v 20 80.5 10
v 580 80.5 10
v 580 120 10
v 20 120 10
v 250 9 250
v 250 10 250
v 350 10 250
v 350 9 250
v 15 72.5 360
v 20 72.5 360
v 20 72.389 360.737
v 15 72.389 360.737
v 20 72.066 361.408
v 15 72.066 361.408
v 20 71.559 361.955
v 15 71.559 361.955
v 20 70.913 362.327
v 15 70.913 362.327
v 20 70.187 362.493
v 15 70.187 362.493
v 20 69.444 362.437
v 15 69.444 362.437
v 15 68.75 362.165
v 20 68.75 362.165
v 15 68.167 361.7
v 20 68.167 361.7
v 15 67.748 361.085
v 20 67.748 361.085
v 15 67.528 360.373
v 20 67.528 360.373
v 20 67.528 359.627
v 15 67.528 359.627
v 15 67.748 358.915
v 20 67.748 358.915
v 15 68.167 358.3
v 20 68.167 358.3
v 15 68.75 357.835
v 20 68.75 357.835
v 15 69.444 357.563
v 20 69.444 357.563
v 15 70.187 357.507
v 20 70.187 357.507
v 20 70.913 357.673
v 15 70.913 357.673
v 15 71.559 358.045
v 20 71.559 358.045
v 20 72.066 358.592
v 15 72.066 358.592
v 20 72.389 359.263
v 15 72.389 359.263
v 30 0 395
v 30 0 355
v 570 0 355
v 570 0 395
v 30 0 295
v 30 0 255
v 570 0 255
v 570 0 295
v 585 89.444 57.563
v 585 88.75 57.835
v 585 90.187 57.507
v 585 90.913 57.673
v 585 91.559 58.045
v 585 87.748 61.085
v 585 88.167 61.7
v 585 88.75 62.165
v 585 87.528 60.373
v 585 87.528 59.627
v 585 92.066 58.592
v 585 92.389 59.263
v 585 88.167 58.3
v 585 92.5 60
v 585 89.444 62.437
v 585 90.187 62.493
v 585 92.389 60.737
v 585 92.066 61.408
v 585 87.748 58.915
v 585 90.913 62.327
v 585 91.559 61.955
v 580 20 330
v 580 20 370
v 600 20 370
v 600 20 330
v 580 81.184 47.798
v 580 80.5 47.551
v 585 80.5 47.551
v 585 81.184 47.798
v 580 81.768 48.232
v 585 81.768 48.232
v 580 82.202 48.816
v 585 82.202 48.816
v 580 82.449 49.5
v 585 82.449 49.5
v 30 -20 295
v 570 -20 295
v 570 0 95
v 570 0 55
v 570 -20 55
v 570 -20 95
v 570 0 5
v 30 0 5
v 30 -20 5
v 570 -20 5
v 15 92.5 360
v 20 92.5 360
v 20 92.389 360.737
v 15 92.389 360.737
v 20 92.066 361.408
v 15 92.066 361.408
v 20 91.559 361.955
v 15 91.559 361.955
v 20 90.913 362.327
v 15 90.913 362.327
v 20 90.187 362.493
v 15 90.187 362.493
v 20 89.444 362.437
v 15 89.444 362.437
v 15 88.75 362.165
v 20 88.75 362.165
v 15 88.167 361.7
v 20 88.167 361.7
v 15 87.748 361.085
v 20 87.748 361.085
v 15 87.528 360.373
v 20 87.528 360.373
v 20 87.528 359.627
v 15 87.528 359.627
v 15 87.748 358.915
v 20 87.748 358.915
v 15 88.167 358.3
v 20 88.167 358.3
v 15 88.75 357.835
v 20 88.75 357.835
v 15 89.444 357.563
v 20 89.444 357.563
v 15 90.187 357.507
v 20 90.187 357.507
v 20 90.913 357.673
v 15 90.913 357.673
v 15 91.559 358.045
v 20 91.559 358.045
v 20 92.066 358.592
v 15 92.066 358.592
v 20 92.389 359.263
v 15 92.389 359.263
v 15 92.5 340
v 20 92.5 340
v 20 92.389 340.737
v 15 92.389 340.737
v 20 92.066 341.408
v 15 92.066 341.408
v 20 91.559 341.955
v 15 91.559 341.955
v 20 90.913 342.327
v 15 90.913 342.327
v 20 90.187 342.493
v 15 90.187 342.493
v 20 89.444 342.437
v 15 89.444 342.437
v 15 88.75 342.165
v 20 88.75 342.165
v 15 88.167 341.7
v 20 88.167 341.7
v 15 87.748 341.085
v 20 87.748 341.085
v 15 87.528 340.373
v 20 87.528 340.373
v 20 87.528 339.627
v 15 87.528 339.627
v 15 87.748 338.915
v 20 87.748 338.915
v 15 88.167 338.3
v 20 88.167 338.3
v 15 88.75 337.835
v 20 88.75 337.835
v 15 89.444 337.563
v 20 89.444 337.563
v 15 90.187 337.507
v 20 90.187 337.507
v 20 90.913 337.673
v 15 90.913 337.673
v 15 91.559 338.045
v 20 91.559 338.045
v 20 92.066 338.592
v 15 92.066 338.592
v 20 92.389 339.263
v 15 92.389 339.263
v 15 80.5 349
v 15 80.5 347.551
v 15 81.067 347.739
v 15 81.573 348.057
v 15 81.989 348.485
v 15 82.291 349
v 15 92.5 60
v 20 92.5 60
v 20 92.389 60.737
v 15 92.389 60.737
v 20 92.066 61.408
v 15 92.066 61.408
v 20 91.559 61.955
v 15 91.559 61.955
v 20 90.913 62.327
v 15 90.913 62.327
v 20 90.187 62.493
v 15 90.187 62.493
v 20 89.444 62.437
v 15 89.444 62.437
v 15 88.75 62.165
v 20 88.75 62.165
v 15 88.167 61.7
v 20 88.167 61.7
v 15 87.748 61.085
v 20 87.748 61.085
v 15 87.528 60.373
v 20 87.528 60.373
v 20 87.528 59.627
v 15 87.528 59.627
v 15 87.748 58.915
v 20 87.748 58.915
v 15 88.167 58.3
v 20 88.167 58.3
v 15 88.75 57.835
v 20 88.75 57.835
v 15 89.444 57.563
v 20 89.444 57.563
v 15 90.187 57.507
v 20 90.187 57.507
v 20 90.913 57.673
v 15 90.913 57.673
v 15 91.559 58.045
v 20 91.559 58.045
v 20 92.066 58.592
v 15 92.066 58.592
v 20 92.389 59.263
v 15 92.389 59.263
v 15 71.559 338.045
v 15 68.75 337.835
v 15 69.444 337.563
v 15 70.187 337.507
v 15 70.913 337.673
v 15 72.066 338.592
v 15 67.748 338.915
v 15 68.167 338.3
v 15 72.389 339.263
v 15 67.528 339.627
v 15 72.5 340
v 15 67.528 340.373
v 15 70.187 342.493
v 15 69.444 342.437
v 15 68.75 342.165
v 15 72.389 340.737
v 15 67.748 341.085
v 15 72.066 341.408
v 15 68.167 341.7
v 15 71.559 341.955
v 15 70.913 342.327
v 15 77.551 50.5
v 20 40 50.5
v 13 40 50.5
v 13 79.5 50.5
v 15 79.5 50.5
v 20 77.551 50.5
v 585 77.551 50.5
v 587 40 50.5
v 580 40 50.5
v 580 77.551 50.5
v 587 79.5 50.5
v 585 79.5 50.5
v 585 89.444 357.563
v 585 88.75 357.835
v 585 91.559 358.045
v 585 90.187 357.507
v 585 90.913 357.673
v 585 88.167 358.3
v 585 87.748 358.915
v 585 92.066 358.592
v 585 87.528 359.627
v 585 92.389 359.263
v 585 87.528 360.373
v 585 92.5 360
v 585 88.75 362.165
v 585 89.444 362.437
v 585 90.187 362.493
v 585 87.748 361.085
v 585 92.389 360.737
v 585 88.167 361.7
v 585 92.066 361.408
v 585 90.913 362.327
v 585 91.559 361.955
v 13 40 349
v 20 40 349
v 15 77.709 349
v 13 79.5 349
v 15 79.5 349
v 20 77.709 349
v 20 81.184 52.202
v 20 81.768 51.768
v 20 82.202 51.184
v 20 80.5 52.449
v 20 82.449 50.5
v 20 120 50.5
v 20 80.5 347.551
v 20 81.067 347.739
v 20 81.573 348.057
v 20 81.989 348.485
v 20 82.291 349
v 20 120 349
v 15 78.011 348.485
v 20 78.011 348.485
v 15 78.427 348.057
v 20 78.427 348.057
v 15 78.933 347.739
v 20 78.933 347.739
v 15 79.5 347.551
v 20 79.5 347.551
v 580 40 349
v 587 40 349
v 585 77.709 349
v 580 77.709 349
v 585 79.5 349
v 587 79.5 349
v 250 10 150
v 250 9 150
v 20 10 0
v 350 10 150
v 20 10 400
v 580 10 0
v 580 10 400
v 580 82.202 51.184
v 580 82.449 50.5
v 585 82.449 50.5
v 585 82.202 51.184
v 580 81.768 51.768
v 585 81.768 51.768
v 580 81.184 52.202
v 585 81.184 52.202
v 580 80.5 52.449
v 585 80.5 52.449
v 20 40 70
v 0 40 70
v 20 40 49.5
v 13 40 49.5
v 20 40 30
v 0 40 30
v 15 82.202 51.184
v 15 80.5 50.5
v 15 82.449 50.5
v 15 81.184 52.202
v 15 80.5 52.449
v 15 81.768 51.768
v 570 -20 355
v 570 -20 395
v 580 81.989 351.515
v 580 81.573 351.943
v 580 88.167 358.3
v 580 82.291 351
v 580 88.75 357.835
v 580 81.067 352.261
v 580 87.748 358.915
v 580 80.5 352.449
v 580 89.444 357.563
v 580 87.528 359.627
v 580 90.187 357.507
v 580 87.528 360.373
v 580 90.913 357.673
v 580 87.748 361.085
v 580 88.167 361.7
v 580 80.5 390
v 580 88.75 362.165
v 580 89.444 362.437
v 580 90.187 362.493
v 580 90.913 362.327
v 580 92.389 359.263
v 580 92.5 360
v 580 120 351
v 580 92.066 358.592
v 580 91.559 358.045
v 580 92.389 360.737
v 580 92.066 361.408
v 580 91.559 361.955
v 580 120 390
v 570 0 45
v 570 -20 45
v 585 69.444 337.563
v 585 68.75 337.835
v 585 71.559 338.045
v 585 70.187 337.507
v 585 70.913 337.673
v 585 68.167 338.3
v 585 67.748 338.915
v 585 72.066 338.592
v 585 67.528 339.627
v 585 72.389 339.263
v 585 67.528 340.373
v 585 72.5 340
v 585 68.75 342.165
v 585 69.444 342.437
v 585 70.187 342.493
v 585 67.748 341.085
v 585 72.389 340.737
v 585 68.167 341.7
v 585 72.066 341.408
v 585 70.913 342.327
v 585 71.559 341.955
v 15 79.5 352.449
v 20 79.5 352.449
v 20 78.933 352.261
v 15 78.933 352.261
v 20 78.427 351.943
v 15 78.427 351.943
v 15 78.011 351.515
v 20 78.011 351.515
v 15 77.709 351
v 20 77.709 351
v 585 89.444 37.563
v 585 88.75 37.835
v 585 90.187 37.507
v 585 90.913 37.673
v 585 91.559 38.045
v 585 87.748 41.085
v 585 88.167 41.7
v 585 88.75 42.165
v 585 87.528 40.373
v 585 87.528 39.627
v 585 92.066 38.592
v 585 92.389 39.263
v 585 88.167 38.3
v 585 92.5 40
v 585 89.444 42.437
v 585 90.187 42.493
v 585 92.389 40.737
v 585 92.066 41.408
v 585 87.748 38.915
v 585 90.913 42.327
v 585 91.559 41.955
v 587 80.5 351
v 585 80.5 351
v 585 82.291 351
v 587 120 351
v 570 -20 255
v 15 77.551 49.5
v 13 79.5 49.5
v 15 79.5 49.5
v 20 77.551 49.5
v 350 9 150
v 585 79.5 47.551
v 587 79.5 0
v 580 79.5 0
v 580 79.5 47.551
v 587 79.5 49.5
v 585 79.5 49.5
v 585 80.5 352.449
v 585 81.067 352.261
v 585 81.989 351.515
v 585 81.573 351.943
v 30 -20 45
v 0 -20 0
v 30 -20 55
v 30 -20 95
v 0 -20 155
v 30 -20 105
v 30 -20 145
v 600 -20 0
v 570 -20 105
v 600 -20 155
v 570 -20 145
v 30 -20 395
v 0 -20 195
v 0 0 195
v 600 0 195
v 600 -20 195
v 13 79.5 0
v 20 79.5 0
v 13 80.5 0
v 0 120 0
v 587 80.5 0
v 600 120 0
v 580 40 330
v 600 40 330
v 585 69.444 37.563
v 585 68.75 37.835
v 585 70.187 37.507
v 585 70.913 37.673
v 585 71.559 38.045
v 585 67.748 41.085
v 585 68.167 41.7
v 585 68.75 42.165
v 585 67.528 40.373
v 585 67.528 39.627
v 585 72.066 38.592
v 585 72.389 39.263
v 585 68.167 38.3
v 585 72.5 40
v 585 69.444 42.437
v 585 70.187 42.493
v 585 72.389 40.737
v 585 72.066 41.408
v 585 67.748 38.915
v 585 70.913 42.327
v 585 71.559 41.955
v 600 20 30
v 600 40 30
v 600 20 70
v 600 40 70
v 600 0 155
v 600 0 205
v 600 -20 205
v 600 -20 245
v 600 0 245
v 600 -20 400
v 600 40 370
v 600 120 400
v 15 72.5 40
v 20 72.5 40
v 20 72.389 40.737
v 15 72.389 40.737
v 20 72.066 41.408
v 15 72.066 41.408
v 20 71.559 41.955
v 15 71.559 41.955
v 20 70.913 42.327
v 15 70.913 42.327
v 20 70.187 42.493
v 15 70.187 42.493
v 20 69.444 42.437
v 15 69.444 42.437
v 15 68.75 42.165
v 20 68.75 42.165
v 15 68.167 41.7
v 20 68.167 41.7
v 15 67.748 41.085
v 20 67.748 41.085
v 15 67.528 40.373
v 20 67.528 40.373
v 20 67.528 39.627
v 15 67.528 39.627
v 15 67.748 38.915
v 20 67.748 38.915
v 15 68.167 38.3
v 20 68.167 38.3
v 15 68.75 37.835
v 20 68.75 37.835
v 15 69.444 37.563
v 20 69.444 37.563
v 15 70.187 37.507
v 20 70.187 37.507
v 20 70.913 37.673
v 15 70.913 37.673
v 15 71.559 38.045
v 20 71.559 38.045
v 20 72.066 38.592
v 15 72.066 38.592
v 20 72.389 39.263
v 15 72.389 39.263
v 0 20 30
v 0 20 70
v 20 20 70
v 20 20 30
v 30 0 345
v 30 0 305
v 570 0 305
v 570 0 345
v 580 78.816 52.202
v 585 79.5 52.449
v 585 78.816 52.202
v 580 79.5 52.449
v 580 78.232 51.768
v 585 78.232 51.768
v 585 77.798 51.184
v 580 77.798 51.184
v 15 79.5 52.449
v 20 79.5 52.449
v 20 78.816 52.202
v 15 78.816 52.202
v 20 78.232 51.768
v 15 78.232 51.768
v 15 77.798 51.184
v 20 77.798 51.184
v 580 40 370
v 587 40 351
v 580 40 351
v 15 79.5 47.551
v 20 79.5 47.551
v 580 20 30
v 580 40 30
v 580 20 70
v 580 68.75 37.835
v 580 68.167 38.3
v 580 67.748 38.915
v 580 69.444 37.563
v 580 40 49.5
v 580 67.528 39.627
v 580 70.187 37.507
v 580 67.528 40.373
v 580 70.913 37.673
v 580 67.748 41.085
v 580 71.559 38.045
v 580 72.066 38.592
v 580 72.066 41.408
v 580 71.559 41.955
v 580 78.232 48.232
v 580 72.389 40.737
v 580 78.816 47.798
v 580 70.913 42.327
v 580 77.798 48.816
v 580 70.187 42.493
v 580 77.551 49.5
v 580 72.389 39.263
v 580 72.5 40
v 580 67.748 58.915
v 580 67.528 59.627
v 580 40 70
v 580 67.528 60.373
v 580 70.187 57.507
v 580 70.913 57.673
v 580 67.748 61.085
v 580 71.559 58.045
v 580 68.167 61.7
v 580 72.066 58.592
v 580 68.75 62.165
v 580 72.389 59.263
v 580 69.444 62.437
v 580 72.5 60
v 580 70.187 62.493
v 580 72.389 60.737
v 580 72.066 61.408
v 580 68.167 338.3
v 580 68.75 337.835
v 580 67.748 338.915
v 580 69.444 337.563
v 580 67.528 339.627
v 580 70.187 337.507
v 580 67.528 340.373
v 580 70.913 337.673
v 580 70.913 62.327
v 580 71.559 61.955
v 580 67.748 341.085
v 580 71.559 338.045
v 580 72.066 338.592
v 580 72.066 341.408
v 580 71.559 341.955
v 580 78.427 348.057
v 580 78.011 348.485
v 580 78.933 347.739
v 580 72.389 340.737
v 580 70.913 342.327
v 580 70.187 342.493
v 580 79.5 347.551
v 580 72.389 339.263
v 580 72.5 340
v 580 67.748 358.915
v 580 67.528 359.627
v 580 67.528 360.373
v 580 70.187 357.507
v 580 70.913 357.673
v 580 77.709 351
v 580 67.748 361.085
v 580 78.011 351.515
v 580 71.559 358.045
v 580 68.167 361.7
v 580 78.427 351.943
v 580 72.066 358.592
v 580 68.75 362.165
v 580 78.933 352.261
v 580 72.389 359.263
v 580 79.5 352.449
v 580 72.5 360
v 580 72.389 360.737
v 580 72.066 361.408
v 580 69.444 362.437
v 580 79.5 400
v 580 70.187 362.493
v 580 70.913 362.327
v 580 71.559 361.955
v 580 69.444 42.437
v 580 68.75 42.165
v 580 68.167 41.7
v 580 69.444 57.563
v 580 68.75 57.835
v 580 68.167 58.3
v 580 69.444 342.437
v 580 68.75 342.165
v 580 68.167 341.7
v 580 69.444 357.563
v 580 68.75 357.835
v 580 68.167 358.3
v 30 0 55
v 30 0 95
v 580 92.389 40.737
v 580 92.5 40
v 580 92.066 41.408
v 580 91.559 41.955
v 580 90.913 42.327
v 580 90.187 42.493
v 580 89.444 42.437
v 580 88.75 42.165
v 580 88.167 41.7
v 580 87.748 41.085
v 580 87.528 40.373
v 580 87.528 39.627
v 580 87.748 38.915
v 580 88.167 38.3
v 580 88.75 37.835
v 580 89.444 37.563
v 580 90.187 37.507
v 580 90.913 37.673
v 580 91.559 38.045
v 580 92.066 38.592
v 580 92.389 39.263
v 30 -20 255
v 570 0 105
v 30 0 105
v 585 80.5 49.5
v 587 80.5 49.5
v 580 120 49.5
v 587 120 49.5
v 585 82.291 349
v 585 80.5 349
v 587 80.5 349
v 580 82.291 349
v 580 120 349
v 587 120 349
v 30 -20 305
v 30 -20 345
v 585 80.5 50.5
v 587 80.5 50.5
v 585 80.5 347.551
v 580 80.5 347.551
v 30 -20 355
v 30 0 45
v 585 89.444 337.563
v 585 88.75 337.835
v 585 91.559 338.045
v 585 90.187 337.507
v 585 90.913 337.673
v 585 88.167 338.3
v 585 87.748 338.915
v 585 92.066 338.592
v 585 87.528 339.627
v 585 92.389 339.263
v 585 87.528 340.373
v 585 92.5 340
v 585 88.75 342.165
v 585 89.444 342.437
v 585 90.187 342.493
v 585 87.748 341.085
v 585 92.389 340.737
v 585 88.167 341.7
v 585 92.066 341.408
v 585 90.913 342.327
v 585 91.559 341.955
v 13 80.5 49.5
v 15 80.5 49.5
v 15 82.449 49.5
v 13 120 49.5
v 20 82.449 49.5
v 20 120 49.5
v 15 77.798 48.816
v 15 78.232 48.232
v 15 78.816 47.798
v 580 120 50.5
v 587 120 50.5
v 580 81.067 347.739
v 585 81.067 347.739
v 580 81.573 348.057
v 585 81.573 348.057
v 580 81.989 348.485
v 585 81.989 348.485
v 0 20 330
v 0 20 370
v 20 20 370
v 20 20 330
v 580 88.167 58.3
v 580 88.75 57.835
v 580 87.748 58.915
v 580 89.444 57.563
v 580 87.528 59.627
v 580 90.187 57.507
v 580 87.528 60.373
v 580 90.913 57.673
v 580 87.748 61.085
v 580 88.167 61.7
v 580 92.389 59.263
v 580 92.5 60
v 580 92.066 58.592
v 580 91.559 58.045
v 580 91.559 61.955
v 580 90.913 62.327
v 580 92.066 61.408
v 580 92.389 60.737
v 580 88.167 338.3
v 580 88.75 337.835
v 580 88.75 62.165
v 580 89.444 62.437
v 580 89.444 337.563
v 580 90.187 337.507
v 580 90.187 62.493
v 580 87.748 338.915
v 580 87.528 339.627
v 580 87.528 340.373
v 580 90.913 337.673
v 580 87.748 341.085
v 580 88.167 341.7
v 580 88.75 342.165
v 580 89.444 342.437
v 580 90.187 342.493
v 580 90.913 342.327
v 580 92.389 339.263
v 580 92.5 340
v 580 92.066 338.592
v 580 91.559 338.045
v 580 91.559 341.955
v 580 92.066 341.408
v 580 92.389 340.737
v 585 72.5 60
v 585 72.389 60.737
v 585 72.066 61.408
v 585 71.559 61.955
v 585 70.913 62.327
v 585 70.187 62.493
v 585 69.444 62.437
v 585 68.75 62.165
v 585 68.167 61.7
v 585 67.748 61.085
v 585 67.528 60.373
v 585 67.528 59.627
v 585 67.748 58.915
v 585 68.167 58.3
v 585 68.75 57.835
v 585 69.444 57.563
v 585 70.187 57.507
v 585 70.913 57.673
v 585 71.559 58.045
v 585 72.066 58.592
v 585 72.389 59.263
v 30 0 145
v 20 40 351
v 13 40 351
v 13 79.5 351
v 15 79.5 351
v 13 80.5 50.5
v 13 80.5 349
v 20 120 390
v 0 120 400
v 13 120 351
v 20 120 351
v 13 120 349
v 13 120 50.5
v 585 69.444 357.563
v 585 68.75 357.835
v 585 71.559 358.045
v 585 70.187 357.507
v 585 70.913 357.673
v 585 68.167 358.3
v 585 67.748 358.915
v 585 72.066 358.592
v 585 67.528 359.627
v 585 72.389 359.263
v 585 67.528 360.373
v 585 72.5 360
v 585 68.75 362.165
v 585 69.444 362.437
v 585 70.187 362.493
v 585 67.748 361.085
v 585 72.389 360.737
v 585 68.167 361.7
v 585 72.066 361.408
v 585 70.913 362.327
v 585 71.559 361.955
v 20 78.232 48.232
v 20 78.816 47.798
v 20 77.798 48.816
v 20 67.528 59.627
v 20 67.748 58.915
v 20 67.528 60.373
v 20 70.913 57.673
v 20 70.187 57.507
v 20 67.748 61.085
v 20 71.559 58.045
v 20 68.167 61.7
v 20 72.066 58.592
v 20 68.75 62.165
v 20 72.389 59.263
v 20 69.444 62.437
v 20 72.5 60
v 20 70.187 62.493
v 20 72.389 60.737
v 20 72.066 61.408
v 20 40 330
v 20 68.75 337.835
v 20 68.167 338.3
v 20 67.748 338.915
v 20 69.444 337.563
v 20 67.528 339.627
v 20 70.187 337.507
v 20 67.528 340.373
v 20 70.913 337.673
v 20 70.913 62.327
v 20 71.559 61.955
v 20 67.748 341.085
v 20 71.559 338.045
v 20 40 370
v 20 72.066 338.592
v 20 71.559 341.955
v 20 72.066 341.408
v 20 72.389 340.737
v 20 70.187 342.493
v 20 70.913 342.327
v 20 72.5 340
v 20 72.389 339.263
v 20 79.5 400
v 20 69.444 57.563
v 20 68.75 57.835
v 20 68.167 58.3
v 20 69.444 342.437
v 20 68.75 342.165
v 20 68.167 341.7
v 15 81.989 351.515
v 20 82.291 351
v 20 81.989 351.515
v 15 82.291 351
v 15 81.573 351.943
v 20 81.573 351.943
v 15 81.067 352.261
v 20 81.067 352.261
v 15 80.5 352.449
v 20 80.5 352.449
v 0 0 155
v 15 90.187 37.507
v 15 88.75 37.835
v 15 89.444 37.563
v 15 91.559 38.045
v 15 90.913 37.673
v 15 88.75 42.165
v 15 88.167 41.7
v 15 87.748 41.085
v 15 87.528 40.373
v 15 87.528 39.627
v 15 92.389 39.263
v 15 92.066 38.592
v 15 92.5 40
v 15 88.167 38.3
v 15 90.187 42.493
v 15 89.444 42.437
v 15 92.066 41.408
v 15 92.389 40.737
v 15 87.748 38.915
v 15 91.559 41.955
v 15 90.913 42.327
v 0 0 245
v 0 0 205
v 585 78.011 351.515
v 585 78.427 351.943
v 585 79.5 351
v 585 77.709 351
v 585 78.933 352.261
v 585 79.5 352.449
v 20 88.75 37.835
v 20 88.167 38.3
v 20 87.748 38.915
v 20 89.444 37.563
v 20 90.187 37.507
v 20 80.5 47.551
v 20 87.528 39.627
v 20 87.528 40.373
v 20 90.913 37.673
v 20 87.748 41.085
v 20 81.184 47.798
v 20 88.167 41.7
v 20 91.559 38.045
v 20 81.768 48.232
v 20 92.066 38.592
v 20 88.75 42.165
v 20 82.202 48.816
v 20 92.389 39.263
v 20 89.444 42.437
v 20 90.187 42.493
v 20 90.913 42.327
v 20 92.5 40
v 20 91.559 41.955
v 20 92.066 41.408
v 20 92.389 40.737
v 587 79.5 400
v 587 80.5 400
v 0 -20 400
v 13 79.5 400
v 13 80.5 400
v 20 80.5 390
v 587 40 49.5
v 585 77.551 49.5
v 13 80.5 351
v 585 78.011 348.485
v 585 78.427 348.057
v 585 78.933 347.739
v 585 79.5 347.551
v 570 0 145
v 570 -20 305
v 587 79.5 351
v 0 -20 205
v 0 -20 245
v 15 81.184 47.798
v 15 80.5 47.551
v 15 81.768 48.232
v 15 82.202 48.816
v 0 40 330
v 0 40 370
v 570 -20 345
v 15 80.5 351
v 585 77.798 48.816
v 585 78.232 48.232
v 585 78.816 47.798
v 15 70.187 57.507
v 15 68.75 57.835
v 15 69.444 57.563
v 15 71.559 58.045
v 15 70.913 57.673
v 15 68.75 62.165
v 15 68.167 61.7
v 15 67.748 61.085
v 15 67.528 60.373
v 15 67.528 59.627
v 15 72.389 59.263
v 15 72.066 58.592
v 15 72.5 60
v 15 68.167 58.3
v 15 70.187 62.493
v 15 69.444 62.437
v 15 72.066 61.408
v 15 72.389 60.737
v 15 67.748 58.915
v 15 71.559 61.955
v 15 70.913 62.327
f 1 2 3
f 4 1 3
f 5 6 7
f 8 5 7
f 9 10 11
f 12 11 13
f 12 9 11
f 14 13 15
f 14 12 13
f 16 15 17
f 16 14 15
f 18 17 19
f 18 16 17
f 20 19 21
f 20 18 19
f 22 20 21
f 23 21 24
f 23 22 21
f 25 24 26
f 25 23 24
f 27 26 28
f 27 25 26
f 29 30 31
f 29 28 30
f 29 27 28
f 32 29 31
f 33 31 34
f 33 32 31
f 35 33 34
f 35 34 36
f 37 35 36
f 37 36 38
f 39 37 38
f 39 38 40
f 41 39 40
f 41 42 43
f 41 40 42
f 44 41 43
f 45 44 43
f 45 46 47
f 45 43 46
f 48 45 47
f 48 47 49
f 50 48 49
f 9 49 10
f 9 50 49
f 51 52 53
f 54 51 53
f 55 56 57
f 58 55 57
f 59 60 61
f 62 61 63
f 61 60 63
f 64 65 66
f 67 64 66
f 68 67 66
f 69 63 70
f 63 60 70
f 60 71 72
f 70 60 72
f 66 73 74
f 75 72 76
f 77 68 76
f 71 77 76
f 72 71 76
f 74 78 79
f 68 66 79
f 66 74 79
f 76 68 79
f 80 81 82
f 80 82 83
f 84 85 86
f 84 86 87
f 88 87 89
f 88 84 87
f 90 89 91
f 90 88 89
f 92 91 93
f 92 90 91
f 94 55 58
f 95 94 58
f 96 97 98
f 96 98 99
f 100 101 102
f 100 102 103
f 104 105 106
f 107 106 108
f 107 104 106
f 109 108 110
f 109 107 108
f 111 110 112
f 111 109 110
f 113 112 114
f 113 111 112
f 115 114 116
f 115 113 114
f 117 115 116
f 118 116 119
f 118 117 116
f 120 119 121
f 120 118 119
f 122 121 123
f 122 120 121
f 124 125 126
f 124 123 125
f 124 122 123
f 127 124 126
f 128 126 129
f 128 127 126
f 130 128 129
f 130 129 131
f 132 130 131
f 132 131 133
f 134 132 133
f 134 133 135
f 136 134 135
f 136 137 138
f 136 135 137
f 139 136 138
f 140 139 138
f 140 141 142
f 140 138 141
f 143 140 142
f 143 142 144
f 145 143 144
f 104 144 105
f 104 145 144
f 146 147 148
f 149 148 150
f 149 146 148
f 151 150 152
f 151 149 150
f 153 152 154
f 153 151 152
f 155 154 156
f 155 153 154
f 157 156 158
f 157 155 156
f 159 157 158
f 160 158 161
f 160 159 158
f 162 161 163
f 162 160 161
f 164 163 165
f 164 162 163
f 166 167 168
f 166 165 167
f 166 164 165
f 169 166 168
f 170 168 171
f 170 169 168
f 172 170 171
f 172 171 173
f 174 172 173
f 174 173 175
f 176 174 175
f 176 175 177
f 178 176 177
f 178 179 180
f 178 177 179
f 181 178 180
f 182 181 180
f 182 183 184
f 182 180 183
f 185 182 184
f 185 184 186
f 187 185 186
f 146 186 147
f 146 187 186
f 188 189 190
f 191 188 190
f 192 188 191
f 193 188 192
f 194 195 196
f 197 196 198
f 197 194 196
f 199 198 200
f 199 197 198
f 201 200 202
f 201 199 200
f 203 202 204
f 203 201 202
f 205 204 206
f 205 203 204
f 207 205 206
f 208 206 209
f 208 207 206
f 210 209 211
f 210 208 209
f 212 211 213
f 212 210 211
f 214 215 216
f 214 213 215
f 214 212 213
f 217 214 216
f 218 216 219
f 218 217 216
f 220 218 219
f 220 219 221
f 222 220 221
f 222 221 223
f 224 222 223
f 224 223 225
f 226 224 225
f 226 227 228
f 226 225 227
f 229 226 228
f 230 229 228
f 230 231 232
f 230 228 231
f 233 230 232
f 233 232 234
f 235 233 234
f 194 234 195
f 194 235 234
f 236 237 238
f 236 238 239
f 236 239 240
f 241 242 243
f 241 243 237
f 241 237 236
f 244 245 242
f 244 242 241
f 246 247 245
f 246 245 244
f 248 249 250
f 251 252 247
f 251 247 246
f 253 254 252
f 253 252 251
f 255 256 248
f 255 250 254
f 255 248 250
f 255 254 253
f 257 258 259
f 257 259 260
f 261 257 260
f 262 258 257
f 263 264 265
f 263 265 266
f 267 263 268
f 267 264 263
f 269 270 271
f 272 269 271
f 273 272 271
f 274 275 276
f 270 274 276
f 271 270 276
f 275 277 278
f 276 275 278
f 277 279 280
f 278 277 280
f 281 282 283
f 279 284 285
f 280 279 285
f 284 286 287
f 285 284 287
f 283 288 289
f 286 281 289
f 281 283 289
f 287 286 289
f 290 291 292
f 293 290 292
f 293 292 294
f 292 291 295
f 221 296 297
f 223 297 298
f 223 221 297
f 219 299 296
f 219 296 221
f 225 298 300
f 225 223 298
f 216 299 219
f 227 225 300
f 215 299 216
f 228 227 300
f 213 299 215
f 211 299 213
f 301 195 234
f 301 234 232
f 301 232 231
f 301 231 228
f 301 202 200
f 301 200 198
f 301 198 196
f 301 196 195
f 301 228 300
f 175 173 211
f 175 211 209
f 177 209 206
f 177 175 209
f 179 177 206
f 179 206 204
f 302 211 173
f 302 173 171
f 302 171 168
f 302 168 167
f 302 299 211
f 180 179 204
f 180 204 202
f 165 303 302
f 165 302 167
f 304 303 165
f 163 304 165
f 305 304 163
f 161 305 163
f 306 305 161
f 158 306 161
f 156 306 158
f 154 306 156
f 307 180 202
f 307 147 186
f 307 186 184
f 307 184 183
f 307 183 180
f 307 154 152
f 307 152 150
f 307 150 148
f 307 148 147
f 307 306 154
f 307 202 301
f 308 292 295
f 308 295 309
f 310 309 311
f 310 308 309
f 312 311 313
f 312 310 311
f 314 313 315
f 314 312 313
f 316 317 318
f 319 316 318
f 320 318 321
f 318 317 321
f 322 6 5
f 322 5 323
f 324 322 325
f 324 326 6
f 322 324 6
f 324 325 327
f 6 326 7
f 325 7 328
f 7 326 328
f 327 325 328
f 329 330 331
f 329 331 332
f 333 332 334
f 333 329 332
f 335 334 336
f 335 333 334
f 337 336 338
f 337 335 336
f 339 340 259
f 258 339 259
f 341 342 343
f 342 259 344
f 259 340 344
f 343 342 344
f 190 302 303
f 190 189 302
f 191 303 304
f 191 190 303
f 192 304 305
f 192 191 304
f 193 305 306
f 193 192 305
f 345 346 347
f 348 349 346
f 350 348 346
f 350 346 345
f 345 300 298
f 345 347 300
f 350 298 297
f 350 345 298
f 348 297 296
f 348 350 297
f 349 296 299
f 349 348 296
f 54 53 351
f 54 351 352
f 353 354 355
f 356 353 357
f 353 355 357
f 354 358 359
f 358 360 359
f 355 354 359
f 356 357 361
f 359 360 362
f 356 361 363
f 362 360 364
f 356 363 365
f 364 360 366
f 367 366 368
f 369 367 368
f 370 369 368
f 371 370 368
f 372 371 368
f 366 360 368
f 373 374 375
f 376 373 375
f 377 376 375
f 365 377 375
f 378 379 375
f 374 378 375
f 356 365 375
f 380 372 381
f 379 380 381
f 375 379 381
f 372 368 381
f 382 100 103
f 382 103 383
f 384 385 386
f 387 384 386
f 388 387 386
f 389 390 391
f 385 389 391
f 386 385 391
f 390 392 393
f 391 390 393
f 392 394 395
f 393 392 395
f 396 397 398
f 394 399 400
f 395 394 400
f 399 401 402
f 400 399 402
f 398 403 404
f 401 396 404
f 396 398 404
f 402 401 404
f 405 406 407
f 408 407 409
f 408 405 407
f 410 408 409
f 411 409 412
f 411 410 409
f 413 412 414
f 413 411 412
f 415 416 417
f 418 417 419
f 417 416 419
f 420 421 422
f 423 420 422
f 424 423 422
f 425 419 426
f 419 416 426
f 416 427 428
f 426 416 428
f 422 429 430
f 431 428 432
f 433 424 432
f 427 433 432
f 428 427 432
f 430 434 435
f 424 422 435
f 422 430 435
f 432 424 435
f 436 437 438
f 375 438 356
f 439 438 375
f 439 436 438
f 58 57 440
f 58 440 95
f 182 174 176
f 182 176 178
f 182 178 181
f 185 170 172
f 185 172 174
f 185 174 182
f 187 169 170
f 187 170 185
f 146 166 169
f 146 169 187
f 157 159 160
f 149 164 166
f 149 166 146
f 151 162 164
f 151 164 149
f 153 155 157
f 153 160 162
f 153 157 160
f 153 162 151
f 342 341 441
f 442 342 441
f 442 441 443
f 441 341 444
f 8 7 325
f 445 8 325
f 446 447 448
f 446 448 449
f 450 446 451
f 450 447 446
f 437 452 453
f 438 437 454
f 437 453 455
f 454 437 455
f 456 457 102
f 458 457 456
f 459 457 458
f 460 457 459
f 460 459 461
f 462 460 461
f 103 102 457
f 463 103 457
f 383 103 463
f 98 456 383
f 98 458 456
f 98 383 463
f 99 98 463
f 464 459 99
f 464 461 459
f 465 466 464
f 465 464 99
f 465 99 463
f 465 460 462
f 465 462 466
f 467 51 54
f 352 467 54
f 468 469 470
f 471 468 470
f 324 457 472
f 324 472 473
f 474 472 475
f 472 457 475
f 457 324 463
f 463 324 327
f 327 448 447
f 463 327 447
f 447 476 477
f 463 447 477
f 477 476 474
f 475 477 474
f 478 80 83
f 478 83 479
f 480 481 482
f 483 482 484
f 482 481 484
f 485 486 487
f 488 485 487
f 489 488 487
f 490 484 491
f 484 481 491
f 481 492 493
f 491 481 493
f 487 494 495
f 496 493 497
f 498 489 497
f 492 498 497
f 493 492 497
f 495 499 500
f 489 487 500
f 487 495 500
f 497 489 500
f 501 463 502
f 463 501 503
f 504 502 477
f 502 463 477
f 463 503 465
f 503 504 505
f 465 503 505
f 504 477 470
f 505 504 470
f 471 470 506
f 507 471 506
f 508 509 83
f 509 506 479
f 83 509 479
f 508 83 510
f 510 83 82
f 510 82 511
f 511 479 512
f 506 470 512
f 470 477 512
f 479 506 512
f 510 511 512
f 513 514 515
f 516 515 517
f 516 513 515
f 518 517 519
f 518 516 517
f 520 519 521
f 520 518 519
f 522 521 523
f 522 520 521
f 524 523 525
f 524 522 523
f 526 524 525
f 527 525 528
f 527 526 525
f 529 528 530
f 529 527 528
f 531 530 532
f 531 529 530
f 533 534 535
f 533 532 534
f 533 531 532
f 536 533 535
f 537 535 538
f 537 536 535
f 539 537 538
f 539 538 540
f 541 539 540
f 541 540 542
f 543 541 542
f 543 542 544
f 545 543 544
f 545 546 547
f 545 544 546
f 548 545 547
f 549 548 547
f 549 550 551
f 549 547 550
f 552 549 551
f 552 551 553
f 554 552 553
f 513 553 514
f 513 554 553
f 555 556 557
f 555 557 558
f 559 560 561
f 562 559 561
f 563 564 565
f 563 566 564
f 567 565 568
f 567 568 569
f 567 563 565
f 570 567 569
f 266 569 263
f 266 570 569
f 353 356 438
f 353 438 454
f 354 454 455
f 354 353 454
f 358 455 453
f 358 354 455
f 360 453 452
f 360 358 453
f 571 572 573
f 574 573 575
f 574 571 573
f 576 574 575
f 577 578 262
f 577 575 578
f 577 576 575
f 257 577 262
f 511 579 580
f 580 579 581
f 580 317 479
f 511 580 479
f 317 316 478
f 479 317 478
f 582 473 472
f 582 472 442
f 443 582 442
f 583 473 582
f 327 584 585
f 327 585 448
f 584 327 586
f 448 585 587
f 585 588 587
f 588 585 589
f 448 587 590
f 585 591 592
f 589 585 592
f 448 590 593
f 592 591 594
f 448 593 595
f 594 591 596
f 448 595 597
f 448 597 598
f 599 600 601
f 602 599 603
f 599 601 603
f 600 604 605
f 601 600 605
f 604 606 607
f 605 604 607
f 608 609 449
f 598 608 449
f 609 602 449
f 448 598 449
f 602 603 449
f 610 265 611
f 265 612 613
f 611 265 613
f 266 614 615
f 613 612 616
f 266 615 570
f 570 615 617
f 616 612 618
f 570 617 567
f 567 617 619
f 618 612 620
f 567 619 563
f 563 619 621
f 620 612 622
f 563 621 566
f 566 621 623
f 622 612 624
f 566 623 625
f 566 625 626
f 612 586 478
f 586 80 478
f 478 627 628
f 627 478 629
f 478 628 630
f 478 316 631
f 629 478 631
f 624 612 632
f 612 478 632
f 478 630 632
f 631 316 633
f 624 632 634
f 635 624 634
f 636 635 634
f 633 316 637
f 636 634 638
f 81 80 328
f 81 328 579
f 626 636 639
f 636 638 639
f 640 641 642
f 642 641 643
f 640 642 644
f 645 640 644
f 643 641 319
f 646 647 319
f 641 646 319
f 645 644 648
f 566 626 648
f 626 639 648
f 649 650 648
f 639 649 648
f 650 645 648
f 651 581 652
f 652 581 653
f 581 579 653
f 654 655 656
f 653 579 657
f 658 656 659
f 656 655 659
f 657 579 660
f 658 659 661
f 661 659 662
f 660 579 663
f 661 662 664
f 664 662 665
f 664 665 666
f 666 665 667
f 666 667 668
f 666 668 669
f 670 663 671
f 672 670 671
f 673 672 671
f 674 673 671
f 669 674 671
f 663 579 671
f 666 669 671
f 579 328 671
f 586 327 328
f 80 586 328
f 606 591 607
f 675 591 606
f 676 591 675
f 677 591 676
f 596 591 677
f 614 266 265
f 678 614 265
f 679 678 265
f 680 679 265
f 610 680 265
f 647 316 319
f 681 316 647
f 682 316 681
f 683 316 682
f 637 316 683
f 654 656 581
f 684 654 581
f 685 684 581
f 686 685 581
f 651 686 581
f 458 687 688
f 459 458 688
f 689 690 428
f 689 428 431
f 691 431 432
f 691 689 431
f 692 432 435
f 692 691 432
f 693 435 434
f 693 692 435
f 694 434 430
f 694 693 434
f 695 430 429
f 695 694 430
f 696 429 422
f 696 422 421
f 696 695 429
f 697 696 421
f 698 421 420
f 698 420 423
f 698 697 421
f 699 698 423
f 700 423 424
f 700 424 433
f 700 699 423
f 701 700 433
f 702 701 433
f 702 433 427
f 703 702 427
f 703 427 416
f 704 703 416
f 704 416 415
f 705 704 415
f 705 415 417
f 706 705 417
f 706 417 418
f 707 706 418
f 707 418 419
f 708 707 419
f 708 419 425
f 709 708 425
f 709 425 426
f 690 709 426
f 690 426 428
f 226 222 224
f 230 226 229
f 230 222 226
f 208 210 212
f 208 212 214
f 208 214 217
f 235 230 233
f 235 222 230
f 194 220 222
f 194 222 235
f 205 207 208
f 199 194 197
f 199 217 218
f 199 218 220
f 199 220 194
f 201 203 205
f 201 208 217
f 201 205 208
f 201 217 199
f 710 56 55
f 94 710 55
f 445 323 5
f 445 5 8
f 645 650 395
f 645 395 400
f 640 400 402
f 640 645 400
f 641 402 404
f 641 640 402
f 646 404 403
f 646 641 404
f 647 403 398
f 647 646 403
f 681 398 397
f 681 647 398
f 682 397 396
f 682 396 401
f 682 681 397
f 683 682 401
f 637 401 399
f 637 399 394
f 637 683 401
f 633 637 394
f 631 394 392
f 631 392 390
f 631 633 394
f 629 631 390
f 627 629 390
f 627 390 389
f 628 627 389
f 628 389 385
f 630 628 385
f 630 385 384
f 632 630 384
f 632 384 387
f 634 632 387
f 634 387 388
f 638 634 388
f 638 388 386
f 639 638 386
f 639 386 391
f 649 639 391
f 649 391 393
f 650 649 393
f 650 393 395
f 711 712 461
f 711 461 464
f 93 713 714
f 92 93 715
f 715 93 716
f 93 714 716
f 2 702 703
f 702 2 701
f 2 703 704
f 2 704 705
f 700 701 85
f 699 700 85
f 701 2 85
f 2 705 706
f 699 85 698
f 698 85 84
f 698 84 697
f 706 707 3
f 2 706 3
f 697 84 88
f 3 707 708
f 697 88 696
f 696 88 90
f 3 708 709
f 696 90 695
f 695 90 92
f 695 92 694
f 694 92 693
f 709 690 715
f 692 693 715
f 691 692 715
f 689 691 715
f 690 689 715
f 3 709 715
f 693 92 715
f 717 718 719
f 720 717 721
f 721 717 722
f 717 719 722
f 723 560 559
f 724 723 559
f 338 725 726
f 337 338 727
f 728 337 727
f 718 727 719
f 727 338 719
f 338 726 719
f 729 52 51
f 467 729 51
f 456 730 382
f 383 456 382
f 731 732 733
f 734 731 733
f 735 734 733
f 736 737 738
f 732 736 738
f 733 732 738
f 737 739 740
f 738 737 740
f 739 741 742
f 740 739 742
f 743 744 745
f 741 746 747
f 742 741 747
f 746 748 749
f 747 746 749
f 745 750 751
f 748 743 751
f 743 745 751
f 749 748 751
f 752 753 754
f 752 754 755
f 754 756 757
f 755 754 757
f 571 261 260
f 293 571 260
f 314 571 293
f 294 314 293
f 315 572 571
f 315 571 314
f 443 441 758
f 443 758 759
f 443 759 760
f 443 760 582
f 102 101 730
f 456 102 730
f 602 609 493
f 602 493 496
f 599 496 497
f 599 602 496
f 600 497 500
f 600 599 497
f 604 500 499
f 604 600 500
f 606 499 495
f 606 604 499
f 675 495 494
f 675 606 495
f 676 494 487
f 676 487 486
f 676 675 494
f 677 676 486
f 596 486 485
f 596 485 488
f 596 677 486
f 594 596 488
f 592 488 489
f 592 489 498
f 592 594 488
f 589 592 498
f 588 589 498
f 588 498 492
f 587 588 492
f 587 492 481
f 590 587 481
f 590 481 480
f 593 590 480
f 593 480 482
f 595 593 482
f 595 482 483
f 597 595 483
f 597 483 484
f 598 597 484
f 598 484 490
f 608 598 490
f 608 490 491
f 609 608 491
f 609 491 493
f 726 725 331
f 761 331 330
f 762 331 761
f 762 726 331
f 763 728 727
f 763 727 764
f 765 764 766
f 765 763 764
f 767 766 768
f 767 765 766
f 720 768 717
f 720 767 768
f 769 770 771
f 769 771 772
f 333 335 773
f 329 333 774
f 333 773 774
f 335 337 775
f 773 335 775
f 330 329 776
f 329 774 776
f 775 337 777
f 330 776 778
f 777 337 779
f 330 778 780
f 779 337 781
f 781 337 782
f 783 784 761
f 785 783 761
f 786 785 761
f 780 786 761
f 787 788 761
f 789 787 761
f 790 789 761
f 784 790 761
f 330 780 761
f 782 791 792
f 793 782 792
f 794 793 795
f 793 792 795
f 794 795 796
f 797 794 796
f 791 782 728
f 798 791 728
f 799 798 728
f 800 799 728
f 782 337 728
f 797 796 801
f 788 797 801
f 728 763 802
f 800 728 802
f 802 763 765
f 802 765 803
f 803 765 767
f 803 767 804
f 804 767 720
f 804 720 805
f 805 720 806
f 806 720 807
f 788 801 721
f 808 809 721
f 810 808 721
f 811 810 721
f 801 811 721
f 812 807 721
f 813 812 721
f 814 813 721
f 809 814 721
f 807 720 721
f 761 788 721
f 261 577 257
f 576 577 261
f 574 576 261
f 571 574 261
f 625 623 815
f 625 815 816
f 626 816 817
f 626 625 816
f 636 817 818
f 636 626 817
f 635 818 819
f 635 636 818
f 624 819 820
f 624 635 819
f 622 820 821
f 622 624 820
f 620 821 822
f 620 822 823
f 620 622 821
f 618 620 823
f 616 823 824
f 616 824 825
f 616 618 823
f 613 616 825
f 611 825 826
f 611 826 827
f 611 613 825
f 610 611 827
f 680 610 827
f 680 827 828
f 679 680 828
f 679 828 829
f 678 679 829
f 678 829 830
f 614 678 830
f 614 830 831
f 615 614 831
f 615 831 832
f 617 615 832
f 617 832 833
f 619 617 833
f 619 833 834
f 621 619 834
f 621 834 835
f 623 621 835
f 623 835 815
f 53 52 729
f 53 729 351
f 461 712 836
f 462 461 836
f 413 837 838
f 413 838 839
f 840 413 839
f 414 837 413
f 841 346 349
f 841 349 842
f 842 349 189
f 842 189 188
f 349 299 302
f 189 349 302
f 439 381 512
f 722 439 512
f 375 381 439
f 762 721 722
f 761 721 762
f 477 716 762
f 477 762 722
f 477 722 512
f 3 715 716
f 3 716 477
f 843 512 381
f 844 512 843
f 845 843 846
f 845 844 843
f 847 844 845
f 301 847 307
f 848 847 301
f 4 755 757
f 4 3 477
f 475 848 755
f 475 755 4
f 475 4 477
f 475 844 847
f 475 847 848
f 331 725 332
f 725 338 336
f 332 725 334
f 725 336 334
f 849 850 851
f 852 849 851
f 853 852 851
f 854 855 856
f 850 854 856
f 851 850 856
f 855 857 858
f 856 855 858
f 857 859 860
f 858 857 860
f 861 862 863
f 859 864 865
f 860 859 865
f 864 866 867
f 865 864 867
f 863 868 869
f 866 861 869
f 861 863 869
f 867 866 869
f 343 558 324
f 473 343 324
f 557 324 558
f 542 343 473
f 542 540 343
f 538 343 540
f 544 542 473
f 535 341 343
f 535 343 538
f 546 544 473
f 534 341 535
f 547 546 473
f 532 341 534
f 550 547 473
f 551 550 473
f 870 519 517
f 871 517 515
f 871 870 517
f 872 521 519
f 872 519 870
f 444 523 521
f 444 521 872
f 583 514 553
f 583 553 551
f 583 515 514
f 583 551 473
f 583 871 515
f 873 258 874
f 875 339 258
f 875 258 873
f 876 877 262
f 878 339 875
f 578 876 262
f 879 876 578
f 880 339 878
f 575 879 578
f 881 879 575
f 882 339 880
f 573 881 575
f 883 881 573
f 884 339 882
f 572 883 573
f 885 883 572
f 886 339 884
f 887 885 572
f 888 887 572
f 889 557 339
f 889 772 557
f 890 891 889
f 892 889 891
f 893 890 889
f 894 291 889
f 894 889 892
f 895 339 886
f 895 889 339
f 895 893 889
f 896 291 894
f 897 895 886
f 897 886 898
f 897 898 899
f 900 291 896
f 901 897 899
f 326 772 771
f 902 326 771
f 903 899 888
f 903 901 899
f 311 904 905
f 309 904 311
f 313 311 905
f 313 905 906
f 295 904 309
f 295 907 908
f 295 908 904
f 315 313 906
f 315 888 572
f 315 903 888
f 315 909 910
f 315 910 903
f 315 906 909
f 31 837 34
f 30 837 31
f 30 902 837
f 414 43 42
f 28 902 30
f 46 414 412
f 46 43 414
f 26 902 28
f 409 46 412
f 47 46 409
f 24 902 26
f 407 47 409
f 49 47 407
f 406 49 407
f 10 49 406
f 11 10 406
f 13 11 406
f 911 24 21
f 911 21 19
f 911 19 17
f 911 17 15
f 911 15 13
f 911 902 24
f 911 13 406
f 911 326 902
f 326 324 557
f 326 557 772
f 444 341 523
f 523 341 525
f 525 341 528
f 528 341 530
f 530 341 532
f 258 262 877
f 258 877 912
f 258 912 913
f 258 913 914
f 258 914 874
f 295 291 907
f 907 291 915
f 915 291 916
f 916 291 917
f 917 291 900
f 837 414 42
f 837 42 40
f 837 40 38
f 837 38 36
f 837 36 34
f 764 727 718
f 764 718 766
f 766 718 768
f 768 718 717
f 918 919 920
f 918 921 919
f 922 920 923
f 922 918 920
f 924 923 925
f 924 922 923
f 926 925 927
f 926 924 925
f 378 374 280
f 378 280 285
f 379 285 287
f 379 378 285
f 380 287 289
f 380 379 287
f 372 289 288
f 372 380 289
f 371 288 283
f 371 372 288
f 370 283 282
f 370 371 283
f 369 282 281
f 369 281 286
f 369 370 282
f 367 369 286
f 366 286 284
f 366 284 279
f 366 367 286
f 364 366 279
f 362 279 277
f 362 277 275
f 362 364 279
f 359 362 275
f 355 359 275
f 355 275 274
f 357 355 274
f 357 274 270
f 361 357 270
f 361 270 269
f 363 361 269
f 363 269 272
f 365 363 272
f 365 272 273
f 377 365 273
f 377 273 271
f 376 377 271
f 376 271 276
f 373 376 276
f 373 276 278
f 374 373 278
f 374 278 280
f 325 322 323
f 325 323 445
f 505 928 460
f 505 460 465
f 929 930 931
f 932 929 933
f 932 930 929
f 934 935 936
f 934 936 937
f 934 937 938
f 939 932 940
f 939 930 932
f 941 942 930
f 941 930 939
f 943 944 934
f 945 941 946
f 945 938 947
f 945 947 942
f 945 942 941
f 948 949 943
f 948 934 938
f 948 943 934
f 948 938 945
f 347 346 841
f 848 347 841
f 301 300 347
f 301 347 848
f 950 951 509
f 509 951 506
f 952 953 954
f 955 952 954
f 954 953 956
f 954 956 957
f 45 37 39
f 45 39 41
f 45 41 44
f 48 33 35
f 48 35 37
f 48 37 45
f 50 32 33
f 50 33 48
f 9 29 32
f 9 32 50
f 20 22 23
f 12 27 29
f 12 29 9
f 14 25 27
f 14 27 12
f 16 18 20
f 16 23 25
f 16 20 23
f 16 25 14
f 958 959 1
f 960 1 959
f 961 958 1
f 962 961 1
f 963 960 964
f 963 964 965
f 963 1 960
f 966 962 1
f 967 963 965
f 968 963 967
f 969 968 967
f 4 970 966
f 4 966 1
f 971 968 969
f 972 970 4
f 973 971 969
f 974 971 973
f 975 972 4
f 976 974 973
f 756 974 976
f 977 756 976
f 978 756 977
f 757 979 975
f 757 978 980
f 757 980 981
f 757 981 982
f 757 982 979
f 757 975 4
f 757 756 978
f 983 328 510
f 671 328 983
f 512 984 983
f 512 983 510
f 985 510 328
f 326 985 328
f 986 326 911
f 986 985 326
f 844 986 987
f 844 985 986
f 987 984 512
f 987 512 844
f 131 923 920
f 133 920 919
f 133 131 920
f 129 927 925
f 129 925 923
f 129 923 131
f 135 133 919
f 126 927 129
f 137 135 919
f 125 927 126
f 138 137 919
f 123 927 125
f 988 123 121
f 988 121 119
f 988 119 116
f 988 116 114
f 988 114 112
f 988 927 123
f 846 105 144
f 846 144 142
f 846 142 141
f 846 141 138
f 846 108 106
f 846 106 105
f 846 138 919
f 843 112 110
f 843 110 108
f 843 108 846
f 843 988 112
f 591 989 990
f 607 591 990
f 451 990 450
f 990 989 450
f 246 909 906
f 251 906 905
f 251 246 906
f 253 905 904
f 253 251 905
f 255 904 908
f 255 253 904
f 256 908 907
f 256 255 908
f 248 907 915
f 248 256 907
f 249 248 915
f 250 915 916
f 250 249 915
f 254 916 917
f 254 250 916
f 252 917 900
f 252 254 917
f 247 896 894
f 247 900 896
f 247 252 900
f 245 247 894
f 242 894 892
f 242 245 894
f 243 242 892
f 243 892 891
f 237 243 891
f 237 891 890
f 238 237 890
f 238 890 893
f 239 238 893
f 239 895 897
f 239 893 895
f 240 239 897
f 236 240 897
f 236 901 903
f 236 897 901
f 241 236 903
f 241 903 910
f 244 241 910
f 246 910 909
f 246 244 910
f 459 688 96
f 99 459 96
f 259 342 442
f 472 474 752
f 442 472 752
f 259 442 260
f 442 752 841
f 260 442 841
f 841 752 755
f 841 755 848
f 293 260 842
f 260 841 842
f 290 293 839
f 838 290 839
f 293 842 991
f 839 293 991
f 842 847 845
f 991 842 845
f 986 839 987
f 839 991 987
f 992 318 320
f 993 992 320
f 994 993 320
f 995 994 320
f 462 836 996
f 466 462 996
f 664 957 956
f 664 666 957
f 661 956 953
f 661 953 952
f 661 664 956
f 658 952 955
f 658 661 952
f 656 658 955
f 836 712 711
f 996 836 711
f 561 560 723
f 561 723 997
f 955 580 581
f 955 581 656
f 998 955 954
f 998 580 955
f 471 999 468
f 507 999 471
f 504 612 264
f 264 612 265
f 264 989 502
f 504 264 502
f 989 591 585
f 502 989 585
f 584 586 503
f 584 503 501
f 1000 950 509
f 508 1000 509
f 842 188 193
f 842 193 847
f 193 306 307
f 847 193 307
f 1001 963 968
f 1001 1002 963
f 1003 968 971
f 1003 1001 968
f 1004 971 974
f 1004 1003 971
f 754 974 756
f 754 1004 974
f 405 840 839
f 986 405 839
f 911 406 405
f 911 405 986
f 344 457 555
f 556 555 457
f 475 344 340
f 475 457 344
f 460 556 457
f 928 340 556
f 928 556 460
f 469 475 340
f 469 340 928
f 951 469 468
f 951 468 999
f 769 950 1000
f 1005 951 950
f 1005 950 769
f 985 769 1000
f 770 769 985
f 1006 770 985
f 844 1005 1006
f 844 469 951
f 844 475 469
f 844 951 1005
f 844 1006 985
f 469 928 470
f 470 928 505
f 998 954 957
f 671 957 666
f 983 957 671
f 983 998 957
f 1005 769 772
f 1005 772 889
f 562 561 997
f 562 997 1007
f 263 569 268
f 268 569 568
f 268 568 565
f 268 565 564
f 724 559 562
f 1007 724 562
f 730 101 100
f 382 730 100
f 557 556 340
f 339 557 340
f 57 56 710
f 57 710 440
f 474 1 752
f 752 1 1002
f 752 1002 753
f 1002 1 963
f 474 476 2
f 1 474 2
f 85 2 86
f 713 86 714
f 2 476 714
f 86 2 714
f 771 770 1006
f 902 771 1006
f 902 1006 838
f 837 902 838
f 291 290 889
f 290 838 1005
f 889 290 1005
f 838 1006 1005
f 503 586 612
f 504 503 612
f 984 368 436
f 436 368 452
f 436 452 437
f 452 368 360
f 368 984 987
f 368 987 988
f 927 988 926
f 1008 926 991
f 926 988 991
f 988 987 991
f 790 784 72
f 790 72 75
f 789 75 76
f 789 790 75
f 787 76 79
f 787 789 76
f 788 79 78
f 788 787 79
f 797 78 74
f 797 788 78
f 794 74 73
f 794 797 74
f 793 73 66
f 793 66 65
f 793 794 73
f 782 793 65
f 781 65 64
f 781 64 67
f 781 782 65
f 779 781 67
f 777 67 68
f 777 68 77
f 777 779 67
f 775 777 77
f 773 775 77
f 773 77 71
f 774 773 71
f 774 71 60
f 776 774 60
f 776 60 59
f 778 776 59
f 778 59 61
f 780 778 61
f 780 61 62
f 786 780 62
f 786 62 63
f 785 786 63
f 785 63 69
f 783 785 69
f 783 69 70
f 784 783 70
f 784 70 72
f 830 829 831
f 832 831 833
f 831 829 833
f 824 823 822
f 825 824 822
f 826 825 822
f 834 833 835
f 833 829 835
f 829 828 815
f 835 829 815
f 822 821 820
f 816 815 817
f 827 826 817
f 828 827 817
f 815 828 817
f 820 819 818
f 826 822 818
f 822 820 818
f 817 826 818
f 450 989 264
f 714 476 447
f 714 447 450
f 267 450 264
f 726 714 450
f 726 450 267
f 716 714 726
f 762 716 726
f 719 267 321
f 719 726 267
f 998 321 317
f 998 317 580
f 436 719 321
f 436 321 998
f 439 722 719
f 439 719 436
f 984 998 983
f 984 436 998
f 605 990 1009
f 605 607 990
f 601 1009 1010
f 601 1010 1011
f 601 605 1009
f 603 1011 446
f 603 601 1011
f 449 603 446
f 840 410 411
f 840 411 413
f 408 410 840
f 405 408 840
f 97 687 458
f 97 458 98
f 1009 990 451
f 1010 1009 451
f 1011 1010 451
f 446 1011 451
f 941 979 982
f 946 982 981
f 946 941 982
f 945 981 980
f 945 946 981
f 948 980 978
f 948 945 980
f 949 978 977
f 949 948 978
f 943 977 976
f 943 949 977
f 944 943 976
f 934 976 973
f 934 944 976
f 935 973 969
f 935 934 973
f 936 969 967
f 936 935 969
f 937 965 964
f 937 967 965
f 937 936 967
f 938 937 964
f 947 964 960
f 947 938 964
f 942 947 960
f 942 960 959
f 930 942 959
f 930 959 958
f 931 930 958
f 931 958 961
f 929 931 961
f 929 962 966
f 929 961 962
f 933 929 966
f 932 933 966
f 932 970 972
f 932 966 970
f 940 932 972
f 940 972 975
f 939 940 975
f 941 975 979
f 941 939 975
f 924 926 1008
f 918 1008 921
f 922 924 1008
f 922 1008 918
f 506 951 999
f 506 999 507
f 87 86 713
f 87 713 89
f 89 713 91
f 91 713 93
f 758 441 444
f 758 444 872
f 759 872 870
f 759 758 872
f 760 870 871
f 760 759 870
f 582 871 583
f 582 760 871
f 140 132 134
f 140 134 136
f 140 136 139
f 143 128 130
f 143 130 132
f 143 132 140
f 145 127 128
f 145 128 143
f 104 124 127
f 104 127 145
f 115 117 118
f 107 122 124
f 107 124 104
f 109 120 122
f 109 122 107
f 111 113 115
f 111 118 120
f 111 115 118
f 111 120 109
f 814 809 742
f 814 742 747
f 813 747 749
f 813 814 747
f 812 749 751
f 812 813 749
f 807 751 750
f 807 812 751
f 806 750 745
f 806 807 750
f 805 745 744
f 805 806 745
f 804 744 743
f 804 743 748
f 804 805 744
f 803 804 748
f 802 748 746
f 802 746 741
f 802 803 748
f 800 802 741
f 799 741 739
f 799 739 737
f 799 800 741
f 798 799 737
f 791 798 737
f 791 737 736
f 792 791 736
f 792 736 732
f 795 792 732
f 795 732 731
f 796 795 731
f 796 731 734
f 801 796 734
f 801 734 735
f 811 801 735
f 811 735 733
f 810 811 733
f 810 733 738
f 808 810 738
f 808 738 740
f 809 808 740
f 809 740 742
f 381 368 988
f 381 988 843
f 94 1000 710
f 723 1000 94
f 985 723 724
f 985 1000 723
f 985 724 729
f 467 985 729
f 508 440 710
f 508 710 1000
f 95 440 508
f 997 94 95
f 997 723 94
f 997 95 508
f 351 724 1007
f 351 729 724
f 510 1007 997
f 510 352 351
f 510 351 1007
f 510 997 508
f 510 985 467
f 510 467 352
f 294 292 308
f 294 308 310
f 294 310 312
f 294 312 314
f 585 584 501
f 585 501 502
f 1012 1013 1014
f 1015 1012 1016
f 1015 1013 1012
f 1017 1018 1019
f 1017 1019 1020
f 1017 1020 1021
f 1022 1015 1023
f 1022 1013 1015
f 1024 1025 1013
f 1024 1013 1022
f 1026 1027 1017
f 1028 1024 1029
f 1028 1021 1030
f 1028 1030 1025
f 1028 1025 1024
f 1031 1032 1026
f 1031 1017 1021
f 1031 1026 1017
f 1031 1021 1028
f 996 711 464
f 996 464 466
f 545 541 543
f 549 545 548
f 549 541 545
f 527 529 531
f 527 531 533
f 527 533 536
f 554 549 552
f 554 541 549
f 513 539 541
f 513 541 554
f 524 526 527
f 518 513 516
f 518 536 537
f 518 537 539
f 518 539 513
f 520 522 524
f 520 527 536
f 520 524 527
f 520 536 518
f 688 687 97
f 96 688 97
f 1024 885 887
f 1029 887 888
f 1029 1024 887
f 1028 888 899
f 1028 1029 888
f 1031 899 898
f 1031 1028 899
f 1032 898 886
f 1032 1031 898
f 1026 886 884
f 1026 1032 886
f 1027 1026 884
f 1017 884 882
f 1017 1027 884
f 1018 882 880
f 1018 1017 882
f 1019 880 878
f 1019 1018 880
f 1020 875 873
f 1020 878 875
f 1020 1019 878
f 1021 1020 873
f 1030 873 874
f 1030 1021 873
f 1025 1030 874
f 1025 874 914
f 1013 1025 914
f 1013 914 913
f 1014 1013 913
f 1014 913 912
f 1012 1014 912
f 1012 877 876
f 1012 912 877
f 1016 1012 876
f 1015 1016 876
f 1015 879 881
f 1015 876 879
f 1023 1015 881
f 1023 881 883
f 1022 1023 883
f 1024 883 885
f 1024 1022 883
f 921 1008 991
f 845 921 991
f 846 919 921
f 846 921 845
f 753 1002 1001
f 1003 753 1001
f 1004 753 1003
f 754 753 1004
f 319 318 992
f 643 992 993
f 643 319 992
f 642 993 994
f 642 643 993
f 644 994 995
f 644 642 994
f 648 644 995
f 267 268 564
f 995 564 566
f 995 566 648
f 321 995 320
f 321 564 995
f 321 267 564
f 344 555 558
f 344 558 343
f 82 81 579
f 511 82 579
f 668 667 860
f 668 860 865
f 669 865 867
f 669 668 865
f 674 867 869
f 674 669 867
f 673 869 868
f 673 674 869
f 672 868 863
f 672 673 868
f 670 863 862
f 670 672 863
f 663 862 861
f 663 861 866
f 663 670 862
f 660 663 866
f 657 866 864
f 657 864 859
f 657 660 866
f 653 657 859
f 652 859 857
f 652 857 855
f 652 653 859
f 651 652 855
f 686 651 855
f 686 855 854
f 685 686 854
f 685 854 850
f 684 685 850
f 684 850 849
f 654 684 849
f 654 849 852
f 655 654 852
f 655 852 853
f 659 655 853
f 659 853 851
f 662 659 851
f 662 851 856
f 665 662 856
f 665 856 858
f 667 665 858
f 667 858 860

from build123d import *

# Parameters (mm, degrees)
BASE_W                   = 600
BASE_H                   = 400
EXTRUDE_1_DEPTH          = 120
SKETCH_5_W               = 600
SKETCH_5_H               = 10
SKETCH_5_H_2             = 5
EXTRUDE_4_DEPTH          = 20
SKETCH_6_W               = 30
SKETCH_6_H               = 155
EXTRUDE_5_DEPTH          = 20
SKETCH_7_W               = 560
SKETCH_7_H               = 110
CUT_EXTRUDE_1_DEPTH      = 732.0266753
CUT_EXTRUDE_2_DEPTH      = 565
CUT_EXTRUDE_2_DEPTH_BACK = 5
SKETCH_8_R               = 2.5
CUT_EXTRUDE_3_DEPTH      = 715.702735408
CUT_EXTRUDE_3_DEPTH_BACK = 715.702735408
SKETCH_9_W               = 40
SKETCH_9_H               = 20
SKETCH_10_W              = 100
SKETCH_10_H              = 100
CUT_EXTRUDE_4_DEPTH      = 1
CUT_EXTRUDE_5_DEPTH      = 567
CUT_EXTRUDE_5_DEPTH_BACK = 7
SKETCH_11_W              = 400
SKETCH_11_H              = 1
CUT_EXTRUDE_7_DEPTH      = 567
CUT_EXTRUDE_7_DEPTH_BACK = 7
SKETCH_13_W              = 1
SKETCH_13_H              = 80
SKETCH_13_W_2            = 2
SKETCH_15_W              = 10
SKETCH_15_H              = 39.5
EXTRUDE_7_DEPTH          = 561


with BuildPart() as part:
    # base → 凸台-拉伸1 (new body)
    with BuildSketch(Plane(origin=(0, 0, 0), x_dir=(1, 0, 0), z_dir=(0, 1, 0))):
        with Locations((300, -200)):
            Rectangle(BASE_W, BASE_H)
    extrude(amount=EXTRUDE_1_DEPTH)

    # 草图5 → 凸台-拉伸4 (add)
    with BuildSketch(Plane.XZ):
        with Locations((300, 150)):
            Rectangle(SKETCH_5_W, SKETCH_5_H)
        with Locations((300, 100)):
            Rectangle(SKETCH_5_W, SKETCH_5_H)
        with Locations((300, 2.5)):
            Rectangle(SKETCH_5_W, SKETCH_5_H_2)
        with Locations((300, 50)):
            Rectangle(SKETCH_5_W, SKETCH_5_H)
        with Locations((300, 250)):
            Rectangle(SKETCH_5_W, SKETCH_5_H)
        with Locations((300, 200)):
            Rectangle(SKETCH_5_W, SKETCH_5_H)
        with Locations((300, 300)):
            Rectangle(SKETCH_5_W, SKETCH_5_H)
        with Locations((300, 350)):
            Rectangle(SKETCH_5_W, SKETCH_5_H)
        with Locations((300, 397.5)):
            Rectangle(SKETCH_5_W, SKETCH_5_H_2)
    extrude(amount=EXTRUDE_4_DEPTH)

    # 草图6 → 凸台-拉伸5 (add)
    with BuildSketch(Plane.XZ):
        with Locations((15, 322.5)):
            Rectangle(SKETCH_6_W, SKETCH_6_H)
        with Locations((15, 77.5)):
            Rectangle(SKETCH_6_W, SKETCH_6_H)
        with Locations((585, 322.5)):
            Rectangle(SKETCH_6_W, SKETCH_6_H)
        with Locations((585, 77.5)):
            Rectangle(SKETCH_6_W, SKETCH_6_H)
    extrude(amount=EXTRUDE_5_DEPTH)

    # 草图7 → 切除-拉伸1 (cut, through all)
    with BuildSketch(Plane.XY.offset(400)):
        with Locations((300, 65)):
            Rectangle(SKETCH_7_W, SKETCH_7_H)
    extrude(amount=-CUT_EXTRUDE_1_DEPTH, mode=Mode.SUBTRACT)

    # 草图8 → 切除-拉伸2 (cut, two sides: drawn at the far end of the back side and taken through both)
    with BuildSketch(Plane(origin=(20, 0, 0), x_dir=(0, 0, -1), z_dir=(1, 0, 0)).offset(-CUT_EXTRUDE_2_DEPTH_BACK)):
        with Locations(Location((-360, 90, 0), (0, 0, 90))):
            Circle(SKETCH_8_R)
        with Locations(Location((-60, 90, 0), (0, 0, 90))):
            Circle(SKETCH_8_R)
        with Locations(Location((-340, 70, 0), (0, 0, 90))):
            Circle(SKETCH_8_R)
        with Locations(Location((-360, 70, 0), (0, 0, 90))):
            Circle(SKETCH_8_R)
        with Locations(Location((-340, 90, 0), (0, 0, 90))):
            Circle(SKETCH_8_R)
        with Locations(Location((-60, 70, 0), (0, 0, 90))):
            Circle(SKETCH_8_R)
        with Locations(Location((-40, 70, 0), (0, 0, 90))):
            Circle(SKETCH_8_R)
        with Locations(Location((-40, 90, 0), (0, 0, 90))):
            Circle(SKETCH_8_R)
        with Locations(Location((-350, 80, 0), (0, 0, 90))):
            Circle(SKETCH_8_R)
        with Locations(Location((-50, 80, 0), (0, 0, 90))):
            Circle(SKETCH_8_R)
    extrude(amount=CUT_EXTRUDE_2_DEPTH + CUT_EXTRUDE_2_DEPTH_BACK, mode=Mode.SUBTRACT)

    # 草图9 → 切除-拉伸3 (cut, two sides: drawn at the far end of the back side and taken through both)
    with BuildSketch(Plane(origin=(20, 0, 0), x_dir=(0, 0, -1), z_dir=(1, 0, 0)).offset(-CUT_EXTRUDE_3_DEPTH_BACK)):
        with Locations((-350, 30)):
            Rectangle(SKETCH_9_W, SKETCH_9_H)
        with Locations((-50, 30)):
            Rectangle(SKETCH_9_W, SKETCH_9_H)
    extrude(amount=CUT_EXTRUDE_3_DEPTH + CUT_EXTRUDE_3_DEPTH_BACK, mode=Mode.SUBTRACT)

    # 草图10 → 切除-拉伸4 (cut)
    with BuildSketch(Plane(origin=(0, 10, 0), x_dir=(1, 0, 0), z_dir=(0, 1, 0))):
        with Locations((300, -200)):
            Rectangle(SKETCH_10_W, SKETCH_10_H)
    extrude(amount=-CUT_EXTRUDE_4_DEPTH, mode=Mode.SUBTRACT)

    # 草图11 → 切除-拉伸5 (cut, two sides: drawn at the far end of the back side and taken through both)
    with BuildSketch(Plane.ZY.offset(-580).offset(-CUT_EXTRUDE_5_DEPTH_BACK)):
        with Locations((200, 80)):
            Rectangle(SKETCH_11_W, SKETCH_11_H)
    extrude(amount=CUT_EXTRUDE_5_DEPTH + CUT_EXTRUDE_5_DEPTH_BACK, mode=Mode.SUBTRACT)

    # 草图13 → 切除-拉伸7 (cut, two sides: drawn at the far end of the back side and taken through both)
    with BuildSketch(Plane.ZY.offset(-580).offset(-CUT_EXTRUDE_7_DEPTH_BACK)):
        with Locations((50, 80)):
            Rectangle(SKETCH_13_W, SKETCH_13_H)
        with Locations((350, 80)):
            Rectangle(SKETCH_13_W_2, SKETCH_13_H)
    extrude(amount=CUT_EXTRUDE_7_DEPTH + CUT_EXTRUDE_7_DEPTH_BACK, mode=Mode.SUBTRACT)

    # 草图15 → 凸台-拉伸7 (add)
    with BuildSketch(Plane(origin=(20, 0, 0), x_dir=(0, 0, -1), z_dir=(1, 0, 0))):
        with Locations((-395, 100.25)):
            Rectangle(SKETCH_15_W, SKETCH_15_H)
        with Locations((-5, 100.25)):
            Rectangle(SKETCH_15_W, SKETCH_15_H)
    extrude(amount=EXTRUDE_7_DEPTH)


solid = part.part
